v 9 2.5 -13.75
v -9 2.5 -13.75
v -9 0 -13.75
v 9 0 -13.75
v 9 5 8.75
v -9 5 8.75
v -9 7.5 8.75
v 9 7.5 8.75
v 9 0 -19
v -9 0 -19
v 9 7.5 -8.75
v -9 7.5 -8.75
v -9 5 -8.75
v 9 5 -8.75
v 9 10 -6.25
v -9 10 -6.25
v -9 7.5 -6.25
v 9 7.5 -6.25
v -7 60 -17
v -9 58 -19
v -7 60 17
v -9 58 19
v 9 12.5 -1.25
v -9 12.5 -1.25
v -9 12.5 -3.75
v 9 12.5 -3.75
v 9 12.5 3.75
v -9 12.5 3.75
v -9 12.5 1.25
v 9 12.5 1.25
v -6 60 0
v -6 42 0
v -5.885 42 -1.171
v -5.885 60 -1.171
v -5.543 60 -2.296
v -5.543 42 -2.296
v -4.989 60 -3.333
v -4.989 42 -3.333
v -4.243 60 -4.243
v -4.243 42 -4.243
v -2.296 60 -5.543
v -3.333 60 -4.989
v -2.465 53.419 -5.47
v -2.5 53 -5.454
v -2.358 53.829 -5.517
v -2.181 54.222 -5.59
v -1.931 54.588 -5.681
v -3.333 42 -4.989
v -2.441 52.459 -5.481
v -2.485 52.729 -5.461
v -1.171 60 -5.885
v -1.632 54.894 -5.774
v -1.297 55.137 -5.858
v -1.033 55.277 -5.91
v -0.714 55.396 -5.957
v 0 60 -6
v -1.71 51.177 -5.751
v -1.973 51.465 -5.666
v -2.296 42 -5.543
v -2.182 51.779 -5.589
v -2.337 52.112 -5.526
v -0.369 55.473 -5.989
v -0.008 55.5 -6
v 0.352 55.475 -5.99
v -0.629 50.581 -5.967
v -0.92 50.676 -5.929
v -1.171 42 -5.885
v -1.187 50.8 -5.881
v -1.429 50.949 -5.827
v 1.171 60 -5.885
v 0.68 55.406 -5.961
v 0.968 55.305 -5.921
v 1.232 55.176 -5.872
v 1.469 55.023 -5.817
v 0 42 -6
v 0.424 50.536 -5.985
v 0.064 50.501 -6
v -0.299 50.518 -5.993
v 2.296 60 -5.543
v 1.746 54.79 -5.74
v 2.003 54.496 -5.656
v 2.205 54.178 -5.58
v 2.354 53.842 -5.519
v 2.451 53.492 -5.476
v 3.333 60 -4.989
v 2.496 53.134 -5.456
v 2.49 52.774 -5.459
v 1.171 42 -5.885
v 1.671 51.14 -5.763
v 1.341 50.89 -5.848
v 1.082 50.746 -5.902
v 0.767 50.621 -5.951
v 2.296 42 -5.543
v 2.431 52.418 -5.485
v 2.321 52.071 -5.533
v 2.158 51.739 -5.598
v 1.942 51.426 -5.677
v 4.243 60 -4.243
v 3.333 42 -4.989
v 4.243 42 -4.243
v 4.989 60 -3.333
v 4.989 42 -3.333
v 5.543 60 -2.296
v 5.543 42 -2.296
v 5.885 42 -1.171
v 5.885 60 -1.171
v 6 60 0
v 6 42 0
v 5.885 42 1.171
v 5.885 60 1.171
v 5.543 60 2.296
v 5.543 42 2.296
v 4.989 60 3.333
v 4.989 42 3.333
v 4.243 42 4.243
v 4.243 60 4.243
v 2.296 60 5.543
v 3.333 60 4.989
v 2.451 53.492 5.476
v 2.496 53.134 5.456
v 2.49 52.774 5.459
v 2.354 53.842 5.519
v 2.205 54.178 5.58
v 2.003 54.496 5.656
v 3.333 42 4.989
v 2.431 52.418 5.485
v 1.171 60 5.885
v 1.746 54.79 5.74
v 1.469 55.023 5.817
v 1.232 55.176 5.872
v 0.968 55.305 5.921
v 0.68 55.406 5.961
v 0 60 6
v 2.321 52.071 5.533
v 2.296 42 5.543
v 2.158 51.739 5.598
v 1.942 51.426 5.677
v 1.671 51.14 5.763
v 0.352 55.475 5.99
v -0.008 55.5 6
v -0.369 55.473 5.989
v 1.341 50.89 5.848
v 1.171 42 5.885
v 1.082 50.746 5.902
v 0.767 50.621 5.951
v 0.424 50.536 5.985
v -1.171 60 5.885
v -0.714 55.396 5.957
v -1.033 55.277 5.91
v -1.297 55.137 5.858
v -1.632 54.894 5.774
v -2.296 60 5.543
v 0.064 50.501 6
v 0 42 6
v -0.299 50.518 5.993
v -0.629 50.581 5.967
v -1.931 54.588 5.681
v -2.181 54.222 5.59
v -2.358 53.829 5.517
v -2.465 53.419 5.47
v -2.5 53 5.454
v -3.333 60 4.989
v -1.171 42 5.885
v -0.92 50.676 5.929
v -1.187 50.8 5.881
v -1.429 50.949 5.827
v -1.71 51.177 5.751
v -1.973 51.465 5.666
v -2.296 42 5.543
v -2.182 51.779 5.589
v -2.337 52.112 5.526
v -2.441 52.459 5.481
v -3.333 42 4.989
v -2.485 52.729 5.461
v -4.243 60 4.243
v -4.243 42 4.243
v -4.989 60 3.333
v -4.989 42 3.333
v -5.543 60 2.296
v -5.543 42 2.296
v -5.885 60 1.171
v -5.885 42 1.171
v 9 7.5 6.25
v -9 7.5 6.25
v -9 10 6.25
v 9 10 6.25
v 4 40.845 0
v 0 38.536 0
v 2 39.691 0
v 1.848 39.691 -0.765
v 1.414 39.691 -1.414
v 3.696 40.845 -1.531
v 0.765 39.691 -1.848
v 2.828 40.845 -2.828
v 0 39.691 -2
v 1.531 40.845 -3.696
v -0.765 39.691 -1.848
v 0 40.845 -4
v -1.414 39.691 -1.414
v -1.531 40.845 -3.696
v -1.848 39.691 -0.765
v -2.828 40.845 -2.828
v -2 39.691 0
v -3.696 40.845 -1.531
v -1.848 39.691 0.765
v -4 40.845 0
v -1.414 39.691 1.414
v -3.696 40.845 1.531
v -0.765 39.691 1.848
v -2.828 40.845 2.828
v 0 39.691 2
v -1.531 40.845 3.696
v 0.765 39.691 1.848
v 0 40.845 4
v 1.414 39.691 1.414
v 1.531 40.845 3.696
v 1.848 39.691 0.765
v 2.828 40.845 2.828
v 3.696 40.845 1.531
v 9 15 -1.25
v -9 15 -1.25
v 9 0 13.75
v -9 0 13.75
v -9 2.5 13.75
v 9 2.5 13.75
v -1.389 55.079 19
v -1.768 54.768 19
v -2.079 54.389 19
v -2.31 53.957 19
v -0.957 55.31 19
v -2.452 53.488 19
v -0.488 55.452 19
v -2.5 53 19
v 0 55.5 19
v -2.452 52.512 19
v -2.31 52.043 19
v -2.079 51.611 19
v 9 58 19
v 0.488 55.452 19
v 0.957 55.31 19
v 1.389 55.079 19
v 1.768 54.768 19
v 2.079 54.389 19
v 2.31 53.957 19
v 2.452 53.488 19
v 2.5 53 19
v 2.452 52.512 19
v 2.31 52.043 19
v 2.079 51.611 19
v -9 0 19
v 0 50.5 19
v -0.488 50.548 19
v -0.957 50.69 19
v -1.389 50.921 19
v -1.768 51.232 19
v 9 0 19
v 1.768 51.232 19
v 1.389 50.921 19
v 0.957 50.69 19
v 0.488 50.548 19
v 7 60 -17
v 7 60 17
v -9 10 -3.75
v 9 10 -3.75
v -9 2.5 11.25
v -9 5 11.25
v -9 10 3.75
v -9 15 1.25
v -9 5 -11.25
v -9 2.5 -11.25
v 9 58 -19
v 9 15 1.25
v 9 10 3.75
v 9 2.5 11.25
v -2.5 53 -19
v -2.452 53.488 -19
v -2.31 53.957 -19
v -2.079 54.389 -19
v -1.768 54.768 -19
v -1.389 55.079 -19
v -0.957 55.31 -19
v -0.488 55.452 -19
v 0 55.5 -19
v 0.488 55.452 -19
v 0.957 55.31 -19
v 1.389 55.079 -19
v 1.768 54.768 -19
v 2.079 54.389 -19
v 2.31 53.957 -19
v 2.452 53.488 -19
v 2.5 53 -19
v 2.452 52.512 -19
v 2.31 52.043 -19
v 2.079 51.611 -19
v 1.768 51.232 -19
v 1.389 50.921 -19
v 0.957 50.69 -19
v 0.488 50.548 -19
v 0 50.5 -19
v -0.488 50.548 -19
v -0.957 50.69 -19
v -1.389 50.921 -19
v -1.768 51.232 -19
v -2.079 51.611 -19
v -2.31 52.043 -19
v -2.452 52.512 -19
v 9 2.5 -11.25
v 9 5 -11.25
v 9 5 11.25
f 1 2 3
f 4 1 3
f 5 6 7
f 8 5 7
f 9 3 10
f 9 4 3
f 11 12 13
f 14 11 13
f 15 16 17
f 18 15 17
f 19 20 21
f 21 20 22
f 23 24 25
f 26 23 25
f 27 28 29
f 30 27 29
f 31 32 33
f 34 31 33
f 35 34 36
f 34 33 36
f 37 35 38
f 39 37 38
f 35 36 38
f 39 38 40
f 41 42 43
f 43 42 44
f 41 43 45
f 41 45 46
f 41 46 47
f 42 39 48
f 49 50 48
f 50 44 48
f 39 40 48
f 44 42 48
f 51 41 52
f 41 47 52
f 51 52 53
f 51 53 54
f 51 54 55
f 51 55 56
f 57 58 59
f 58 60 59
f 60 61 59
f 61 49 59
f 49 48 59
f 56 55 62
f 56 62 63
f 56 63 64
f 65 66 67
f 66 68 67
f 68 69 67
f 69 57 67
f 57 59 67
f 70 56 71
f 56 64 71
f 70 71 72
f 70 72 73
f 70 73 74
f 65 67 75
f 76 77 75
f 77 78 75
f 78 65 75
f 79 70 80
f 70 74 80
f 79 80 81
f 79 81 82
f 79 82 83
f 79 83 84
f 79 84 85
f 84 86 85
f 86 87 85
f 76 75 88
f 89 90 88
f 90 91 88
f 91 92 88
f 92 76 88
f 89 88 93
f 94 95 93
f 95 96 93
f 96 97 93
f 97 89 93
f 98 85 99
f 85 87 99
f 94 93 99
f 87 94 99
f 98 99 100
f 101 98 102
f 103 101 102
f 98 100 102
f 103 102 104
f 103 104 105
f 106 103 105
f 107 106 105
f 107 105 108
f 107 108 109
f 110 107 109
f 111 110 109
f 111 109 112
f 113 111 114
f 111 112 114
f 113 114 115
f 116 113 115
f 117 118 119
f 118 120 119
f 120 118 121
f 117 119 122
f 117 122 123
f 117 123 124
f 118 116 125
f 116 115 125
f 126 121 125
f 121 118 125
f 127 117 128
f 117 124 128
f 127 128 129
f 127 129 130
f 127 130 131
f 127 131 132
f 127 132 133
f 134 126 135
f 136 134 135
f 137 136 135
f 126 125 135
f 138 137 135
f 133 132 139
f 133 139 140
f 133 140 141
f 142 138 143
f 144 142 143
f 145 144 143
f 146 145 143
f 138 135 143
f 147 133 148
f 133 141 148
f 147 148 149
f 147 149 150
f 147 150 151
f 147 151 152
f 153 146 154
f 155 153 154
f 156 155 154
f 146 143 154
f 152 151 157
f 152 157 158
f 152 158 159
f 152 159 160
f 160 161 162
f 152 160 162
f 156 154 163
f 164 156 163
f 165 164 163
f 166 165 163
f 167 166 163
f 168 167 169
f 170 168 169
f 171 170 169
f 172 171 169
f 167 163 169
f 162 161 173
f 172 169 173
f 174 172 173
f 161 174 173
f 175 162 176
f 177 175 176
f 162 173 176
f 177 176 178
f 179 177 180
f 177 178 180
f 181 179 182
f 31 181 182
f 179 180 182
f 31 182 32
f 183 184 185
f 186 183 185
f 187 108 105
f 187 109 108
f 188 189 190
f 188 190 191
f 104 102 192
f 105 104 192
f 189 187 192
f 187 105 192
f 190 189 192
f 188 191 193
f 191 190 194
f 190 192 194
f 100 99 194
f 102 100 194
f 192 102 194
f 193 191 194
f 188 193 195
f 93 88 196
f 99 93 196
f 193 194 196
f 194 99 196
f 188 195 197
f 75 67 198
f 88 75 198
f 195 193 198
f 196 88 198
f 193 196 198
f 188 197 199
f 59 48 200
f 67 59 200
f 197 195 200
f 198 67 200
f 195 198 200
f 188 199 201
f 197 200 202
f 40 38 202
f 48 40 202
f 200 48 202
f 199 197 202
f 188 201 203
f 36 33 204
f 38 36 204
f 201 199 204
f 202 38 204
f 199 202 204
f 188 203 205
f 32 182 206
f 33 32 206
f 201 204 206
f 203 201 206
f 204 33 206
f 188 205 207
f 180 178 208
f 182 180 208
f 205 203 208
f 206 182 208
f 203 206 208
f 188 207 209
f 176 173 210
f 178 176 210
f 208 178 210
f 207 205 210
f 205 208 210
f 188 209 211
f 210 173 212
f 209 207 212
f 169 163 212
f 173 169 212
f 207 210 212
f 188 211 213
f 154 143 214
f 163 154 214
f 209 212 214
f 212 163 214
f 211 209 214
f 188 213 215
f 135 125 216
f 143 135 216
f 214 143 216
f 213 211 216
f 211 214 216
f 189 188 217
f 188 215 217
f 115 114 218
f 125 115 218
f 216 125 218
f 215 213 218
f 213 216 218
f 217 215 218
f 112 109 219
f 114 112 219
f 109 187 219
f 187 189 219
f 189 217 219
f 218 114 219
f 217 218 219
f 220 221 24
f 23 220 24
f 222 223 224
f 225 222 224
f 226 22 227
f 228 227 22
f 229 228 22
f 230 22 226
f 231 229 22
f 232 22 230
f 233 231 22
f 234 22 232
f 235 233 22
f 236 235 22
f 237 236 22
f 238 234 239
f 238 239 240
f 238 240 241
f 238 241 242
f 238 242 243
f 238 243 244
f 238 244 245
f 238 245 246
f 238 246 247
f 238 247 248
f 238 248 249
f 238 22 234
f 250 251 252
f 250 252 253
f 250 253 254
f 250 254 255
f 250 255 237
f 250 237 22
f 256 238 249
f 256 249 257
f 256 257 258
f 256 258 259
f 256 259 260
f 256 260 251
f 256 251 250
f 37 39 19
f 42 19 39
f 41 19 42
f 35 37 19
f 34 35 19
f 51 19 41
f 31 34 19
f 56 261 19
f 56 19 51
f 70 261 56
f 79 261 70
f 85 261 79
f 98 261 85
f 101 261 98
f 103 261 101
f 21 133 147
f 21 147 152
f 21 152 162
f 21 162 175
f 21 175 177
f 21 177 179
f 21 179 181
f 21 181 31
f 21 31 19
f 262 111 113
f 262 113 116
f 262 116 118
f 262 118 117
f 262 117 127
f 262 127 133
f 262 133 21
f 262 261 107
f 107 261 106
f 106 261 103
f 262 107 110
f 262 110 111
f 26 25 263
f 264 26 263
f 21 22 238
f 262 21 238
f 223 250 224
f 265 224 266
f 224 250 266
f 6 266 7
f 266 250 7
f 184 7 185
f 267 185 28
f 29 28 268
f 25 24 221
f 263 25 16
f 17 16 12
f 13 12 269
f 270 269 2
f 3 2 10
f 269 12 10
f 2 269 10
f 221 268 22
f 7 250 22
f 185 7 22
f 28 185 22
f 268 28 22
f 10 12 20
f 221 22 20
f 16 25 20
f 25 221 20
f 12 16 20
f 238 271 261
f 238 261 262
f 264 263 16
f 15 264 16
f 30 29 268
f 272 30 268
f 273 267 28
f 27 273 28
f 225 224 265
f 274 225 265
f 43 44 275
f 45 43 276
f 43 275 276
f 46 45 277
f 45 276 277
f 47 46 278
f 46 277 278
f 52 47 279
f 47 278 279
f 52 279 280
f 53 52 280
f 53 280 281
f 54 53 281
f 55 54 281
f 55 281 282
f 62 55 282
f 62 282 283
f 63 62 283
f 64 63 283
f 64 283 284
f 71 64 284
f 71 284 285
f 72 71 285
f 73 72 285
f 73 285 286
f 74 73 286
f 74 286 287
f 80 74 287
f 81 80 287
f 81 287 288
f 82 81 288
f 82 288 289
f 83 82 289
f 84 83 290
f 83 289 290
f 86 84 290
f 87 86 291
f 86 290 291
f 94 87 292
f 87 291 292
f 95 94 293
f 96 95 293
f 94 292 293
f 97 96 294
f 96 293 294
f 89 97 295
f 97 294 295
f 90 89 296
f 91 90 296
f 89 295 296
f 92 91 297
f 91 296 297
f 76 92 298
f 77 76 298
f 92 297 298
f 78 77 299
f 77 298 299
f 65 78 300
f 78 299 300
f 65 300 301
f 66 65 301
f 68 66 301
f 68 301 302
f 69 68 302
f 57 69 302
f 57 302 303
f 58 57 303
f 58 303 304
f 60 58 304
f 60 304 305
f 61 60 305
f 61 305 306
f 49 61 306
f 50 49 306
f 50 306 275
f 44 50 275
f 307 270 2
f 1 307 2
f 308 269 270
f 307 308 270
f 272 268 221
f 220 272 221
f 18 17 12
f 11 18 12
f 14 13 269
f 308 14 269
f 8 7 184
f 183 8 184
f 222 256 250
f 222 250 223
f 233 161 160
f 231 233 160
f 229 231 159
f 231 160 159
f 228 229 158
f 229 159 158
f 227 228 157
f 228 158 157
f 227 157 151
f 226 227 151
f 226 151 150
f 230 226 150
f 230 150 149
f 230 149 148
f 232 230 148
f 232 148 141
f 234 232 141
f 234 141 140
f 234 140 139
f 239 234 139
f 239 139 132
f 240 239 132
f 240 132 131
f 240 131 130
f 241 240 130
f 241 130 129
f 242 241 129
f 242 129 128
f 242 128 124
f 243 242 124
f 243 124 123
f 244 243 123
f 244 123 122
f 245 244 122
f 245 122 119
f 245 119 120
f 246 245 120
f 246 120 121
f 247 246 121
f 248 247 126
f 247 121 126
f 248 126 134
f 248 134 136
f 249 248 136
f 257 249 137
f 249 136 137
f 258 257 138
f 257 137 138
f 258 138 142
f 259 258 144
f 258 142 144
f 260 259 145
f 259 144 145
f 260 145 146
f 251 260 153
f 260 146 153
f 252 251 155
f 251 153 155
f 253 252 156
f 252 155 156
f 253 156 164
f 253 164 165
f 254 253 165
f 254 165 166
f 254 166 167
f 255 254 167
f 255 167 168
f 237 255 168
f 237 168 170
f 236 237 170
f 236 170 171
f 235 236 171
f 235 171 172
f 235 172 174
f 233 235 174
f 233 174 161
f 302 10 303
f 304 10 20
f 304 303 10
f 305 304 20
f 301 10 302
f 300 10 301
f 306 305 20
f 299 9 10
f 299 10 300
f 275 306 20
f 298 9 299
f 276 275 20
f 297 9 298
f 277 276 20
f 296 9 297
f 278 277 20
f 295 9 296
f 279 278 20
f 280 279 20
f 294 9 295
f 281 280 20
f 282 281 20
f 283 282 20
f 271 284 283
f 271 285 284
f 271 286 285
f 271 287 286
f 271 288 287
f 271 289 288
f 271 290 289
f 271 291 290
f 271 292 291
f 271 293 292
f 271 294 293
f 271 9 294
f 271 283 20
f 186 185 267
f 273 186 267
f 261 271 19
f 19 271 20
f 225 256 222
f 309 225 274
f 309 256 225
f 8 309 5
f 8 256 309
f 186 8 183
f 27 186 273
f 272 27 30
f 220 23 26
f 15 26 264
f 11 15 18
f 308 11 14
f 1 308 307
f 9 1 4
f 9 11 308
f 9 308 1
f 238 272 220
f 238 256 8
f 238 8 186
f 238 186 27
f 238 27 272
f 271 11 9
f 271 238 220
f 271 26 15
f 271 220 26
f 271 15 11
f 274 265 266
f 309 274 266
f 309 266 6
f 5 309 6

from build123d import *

# Parameters (mm, degrees)
BOSS_EXTRUDE1_DEPTH       = 9
CHAMFER1_SIZE             = 2
F_1_0MM_DOWEL_HOLE1_D     = 12
F_1_0MM_DOWEL_HOLE1_DEPTH = 18
F_1_0MM_DOWEL_HOLE1_TIP   = 3.464101615
M6X1_0_TAPPED_HOLE1_D     = 5


with BuildPart() as part:
    # Sketch1 → Boss-Extrude1 (new, symmetric)
    with BuildSketch(Plane(origin=(0, 0, 0), x_dir=(0, 0, -1), z_dir=(1, 0, 0))):
        Polygon((19, 60), (-19, 60), (-19, 0), (-13.75, 0), (-13.75, 2.5), (-11.25, 2.5), (-11.25, 5), (-8.75, 5), (-8.75, 7.5), (-6.25, 7.5), (-6.25, 10), (-3.75, 10), (-3.75, 12.5), (-1.25, 12.5), (-1.25, 15), (1.25, 15), (1.25, 12.5), (3.75, 12.5), (3.75, 10), (6.25, 10), (6.25, 7.5), (8.75, 7.5), (8.75, 5), (11.25, 5), (11.25, 2.5), (13.75, 2.5), (13.75, 0), (19, 0), align=None)
    extrude(amount=BOSS_EXTRUDE1_DEPTH, both=True)

    # Chamfer1
    chamfer1_edges = [part.edges().sort_by_distance(p)[0] for p in [
        (-9, 60, 0),
        (0, 60, 19),
        (0, 60, -19),
        (9, 60, 0),
    ]]
    chamfer(chamfer1_edges, length=CHAMFER1_SIZE)

    # Ø1.0mm Dowel Hole1
    with Locations(Plane(origin=(0, 60, 0), x_dir=(1, 0, 0), z_dir=(0, 1, 0))):
        with Locations((0, 0)):
            Hole(F_1_0MM_DOWEL_HOLE1_D / 2, depth=F_1_0MM_DOWEL_HOLE1_DEPTH)
            with Locations((0, 0, -(F_1_0MM_DOWEL_HOLE1_DEPTH + F_1_0MM_DOWEL_HOLE1_TIP / 2))):  # 120° drill point
                Cone(0, F_1_0MM_DOWEL_HOLE1_D / 2, F_1_0MM_DOWEL_HOLE1_TIP, mode=Mode.SUBTRACT)

    # M6x1.0 Tapped Hole1 (through all)
    with Locations(Plane.XY.offset(19)):
        with Locations((0, 53)):
            Hole(M6X1_0_TAPPED_HOLE1_D / 2)


solid = part.part
